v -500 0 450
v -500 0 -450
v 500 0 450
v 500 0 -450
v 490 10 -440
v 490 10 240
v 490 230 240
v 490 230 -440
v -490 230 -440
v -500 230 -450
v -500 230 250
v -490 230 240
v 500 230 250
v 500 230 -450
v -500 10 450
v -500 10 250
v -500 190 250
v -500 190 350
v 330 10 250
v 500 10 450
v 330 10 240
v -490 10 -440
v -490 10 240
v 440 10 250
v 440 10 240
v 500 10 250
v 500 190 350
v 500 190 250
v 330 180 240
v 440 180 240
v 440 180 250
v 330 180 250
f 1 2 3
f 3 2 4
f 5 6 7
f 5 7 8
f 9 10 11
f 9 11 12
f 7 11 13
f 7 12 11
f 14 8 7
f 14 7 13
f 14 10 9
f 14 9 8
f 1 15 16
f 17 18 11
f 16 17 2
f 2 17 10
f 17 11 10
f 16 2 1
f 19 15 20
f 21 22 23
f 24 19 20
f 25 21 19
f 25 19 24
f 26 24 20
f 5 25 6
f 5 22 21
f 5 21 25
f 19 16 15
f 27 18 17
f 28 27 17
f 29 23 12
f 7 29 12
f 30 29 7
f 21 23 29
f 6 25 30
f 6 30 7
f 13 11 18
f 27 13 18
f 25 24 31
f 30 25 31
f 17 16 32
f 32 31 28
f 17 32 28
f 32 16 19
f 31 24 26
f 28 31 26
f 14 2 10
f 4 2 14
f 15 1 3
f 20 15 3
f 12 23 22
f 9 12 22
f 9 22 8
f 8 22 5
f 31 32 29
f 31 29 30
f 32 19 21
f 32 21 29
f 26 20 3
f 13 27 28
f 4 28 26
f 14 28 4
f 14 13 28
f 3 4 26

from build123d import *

# Parameters (mm, degrees)
SKETCH1_W           = 1000
SKETCH1_H           = 900
BOSS_EXTRUDE1_DEPTH = 10
SKETCH2_W           = 1000
SKETCH2_H           = 700
SKETCH2_W_2         = 980
SKETCH2_H_2         = 680
BOSS_EXTRUDE2_DEPTH = 220
SKETCH3_W           = 110
SKETCH3_H           = 170
CUT_EXTRUDE1_DEPTH  = 280
BOSS_EXTRUDE3_DEPTH = 1000


with BuildPart() as part:
    # Sketch1 → Boss-Extrude1 (new body)
    with BuildSketch(Plane(origin=(0, 0, 0), x_dir=(1, 0, 0), z_dir=(0, 1, 0))):
        Rectangle(SKETCH1_W, SKETCH1_H)
    extrude(amount=BOSS_EXTRUDE1_DEPTH)

    # Sketch2 → Boss-Extrude2 (add)
    with BuildSketch(Plane(origin=(0, 10, 0), x_dir=(1, 0, 0), z_dir=(0, 1, 0))):
        with Locations((0, 100)):
            Rectangle(SKETCH2_W, SKETCH2_H)
        with Locations((0, 100)):
            Rectangle(SKETCH2_W_2, SKETCH2_H_2, mode=Mode.SUBTRACT)
    extrude(amount=BOSS_EXTRUDE2_DEPTH)

    # Sketch3 → Cut-Extrude1 (cut)
    with BuildSketch(Plane.XY.offset(450)):
        with Locations((385, 95)):
            Rectangle(SKETCH3_W, SKETCH3_H)
    extrude(amount=-CUT_EXTRUDE1_DEPTH, mode=Mode.SUBTRACT)

    # Sketch5 → Boss-Extrude3 (add)
    with BuildSketch(Plane.ZY.offset(500)):
        Polygon((250, 230), (350, 190), (250, 190), align=None)
    extrude(amount=-BOSS_EXTRUDE3_DEPTH)


solid = part.part
